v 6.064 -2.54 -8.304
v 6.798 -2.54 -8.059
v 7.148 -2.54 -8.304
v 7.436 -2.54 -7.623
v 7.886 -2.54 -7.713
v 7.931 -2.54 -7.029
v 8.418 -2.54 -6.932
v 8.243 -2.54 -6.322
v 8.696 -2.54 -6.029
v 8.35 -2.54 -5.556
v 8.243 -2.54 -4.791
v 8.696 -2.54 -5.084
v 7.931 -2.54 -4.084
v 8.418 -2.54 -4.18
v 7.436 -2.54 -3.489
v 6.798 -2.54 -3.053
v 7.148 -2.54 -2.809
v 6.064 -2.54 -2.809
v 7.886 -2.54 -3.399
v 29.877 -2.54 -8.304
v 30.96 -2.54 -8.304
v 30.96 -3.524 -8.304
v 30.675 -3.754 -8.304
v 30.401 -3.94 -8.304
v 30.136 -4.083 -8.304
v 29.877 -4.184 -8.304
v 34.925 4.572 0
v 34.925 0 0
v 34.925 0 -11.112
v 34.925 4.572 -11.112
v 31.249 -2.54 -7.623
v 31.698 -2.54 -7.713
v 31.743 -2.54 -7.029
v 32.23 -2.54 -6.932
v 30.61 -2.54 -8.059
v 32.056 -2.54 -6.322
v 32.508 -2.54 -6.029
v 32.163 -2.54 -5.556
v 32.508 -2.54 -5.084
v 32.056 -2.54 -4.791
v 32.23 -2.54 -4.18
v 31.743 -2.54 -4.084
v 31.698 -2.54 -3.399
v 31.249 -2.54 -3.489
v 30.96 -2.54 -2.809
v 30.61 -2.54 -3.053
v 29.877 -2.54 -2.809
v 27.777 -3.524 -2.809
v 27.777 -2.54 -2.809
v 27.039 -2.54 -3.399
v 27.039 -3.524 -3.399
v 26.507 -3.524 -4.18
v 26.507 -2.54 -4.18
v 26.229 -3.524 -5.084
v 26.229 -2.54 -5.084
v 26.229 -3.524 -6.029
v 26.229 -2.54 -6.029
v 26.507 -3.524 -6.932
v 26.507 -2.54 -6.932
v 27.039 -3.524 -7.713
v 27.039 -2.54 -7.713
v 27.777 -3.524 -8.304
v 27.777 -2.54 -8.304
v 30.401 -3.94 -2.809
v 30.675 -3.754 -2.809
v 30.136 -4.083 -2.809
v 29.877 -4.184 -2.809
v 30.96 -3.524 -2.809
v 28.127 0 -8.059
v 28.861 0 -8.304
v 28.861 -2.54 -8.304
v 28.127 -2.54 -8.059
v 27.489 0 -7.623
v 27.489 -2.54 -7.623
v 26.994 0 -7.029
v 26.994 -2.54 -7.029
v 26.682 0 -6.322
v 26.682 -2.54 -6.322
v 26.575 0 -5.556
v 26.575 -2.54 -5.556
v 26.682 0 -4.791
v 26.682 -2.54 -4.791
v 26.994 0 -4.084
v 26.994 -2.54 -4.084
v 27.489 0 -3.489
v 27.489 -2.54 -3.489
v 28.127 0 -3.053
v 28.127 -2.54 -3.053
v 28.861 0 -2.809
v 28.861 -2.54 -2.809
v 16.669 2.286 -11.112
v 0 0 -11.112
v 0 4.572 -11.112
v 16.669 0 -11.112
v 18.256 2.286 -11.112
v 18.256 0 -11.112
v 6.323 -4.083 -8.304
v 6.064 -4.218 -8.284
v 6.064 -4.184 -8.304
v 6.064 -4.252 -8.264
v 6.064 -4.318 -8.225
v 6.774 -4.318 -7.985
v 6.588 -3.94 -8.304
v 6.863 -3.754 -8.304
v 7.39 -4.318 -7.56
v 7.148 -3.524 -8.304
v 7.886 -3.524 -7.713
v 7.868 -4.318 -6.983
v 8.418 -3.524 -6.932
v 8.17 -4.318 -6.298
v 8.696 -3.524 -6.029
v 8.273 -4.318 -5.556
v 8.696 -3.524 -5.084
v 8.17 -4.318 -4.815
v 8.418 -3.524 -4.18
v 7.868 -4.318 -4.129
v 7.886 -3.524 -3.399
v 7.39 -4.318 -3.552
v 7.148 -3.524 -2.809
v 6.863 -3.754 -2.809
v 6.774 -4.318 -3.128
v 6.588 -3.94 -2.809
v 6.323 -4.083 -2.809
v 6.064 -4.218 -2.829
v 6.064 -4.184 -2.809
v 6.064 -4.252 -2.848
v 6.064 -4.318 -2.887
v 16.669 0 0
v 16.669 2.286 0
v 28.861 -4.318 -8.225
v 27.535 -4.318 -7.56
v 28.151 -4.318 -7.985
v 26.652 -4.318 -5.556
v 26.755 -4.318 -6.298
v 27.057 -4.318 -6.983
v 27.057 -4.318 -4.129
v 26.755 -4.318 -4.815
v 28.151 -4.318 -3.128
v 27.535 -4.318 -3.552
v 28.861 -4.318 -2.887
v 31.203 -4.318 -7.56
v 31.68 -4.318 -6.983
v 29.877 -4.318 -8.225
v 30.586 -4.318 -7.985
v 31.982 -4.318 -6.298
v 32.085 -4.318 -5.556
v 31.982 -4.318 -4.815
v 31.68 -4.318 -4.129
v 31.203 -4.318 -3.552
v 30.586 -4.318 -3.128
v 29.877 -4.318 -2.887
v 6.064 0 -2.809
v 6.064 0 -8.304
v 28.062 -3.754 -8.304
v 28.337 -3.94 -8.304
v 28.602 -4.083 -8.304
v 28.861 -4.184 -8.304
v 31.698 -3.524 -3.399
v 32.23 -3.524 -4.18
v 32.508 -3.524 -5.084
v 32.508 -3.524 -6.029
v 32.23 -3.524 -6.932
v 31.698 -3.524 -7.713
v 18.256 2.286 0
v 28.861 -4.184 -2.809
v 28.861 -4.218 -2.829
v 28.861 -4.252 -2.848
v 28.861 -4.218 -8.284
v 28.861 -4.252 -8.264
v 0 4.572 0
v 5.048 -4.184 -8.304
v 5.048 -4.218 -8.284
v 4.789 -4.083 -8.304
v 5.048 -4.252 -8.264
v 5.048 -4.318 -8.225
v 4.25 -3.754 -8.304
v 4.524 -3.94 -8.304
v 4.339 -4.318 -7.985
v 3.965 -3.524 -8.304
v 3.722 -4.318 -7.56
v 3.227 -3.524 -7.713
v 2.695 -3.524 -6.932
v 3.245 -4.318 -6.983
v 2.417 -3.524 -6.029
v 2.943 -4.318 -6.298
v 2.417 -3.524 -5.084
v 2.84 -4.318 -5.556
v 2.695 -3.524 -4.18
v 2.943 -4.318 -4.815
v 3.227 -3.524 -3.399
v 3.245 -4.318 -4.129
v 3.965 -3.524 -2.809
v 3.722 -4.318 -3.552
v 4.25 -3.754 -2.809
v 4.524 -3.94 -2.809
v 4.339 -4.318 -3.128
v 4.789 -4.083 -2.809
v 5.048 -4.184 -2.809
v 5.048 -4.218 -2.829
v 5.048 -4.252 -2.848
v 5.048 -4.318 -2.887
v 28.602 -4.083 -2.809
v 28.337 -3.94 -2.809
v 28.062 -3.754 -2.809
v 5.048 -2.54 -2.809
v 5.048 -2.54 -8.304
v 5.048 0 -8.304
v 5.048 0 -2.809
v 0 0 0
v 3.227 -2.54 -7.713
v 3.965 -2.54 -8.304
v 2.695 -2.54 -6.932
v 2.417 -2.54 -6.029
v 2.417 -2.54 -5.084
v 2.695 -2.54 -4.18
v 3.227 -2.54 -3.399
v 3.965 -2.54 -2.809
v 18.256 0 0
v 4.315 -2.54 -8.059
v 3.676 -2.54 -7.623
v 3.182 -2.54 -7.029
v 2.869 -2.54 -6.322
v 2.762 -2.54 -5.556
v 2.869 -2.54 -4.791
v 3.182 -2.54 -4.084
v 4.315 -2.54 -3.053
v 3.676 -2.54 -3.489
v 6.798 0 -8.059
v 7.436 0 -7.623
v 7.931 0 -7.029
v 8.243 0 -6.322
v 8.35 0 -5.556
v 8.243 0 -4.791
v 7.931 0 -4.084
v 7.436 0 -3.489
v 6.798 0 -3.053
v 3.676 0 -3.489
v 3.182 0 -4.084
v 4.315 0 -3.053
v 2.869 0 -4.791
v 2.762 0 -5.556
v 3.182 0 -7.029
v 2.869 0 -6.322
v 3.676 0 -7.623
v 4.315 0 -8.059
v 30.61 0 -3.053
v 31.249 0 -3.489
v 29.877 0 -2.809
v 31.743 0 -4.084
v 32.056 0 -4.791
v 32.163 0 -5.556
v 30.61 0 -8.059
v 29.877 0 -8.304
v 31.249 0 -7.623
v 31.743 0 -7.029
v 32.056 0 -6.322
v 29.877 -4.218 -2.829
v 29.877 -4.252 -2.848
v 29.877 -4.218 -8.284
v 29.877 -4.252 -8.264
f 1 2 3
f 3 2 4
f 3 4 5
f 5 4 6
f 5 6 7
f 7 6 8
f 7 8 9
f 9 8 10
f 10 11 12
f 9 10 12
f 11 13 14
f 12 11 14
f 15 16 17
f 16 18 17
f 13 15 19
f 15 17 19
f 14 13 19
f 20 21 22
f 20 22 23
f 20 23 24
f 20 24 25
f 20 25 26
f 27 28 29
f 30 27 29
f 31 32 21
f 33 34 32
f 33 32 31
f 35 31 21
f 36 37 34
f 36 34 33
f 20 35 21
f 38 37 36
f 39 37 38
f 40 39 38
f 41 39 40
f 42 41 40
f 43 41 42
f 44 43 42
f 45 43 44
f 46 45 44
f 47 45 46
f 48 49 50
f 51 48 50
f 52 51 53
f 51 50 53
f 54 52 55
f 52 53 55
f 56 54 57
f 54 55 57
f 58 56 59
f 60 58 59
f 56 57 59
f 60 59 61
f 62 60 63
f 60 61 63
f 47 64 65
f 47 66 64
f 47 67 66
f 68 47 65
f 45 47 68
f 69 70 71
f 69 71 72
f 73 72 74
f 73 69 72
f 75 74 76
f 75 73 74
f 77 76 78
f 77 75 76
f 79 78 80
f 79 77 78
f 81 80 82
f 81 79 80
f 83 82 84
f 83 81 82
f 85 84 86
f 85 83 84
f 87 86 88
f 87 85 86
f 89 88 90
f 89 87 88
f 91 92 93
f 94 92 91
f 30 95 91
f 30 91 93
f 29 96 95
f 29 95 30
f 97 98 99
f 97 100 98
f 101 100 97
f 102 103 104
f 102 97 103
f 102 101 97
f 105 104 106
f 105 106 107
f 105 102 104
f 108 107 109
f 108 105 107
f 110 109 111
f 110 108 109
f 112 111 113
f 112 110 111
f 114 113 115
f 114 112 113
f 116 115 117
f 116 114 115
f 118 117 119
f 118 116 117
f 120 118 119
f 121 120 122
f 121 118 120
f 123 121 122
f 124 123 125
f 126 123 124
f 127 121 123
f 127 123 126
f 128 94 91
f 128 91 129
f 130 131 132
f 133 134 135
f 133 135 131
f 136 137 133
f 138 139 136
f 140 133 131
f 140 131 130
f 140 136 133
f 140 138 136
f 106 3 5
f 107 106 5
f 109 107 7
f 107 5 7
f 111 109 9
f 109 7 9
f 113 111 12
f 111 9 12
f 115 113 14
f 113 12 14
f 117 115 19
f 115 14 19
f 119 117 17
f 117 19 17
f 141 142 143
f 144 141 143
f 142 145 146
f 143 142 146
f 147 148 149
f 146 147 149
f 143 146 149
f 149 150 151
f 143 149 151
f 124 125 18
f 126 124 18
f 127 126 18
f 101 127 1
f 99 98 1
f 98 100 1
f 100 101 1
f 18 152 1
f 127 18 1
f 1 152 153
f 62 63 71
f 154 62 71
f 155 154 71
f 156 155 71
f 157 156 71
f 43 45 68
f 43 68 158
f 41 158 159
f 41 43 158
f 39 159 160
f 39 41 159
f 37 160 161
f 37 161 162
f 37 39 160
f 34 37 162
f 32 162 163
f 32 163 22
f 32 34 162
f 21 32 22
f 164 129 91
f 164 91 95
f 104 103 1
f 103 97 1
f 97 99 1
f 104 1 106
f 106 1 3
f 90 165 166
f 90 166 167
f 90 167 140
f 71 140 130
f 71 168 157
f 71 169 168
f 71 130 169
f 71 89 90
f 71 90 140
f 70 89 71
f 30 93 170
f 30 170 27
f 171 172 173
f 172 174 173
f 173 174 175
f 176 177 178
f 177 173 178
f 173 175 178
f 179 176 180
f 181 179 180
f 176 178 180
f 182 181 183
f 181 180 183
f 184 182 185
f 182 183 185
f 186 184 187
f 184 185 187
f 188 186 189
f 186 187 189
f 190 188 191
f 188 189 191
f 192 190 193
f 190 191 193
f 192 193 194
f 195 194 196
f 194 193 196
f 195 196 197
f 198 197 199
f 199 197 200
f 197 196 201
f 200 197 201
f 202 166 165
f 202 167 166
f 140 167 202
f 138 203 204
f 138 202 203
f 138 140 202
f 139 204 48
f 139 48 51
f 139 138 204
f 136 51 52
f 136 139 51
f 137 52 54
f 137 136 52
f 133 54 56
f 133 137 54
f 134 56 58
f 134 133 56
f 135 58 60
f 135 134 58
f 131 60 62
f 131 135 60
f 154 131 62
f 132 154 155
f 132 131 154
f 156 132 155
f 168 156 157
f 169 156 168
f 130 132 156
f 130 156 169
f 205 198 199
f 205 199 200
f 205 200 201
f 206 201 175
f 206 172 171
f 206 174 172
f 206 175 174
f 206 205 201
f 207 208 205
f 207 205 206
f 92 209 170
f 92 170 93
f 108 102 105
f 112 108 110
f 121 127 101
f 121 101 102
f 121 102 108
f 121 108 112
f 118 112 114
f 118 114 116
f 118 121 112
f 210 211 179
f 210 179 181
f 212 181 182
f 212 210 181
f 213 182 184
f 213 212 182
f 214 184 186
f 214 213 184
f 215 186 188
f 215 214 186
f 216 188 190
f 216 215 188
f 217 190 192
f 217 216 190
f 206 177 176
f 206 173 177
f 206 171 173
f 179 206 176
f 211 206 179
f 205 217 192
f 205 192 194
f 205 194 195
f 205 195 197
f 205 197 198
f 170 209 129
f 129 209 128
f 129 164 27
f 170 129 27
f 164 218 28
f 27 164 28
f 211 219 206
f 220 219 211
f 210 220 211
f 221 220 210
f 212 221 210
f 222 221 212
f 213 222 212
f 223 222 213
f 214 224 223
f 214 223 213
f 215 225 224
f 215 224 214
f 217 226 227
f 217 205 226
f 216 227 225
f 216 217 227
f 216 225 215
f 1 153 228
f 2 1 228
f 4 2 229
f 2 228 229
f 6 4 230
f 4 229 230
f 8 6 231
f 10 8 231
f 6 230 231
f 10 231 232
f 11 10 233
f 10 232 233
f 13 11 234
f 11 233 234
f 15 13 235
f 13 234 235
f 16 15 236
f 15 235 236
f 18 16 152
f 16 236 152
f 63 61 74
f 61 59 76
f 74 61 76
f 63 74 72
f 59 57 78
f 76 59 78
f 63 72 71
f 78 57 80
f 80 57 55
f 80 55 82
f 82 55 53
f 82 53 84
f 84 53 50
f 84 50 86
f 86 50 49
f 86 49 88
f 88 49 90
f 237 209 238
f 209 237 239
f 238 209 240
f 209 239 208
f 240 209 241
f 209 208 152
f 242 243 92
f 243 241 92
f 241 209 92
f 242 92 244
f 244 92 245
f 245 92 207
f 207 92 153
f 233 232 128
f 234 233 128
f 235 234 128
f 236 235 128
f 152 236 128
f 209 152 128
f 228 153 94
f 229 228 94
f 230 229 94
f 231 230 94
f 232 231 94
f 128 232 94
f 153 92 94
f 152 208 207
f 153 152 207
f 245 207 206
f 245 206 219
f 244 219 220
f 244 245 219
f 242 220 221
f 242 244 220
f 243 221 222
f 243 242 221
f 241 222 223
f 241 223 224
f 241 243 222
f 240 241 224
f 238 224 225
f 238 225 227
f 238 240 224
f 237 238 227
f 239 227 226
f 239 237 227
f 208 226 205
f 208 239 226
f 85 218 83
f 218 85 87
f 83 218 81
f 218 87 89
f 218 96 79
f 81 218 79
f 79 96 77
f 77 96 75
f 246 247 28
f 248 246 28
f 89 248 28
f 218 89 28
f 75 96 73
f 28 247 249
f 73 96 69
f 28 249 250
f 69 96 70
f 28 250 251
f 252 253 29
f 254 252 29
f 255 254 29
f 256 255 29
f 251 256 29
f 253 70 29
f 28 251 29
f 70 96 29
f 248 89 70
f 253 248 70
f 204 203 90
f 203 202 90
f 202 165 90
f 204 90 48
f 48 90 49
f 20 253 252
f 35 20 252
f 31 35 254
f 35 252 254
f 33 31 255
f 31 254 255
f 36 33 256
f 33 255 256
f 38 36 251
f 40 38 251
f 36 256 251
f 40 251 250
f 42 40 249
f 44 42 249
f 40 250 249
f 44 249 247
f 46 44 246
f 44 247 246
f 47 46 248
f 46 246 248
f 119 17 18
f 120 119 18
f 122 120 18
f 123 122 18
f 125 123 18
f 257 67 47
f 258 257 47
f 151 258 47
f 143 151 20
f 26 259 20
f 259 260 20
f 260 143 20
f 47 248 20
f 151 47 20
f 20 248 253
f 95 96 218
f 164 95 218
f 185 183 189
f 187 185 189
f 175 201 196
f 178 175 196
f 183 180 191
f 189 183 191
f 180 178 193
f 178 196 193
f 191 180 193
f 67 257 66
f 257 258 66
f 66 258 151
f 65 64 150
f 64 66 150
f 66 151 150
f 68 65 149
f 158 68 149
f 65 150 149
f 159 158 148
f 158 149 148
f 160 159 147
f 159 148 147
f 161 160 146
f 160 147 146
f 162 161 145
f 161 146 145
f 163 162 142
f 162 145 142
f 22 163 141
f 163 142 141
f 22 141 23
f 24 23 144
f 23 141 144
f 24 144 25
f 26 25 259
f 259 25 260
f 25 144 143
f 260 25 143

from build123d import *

# Parameters (mm, degrees)
SKETCH1_W             = 34.925
SKETCH1_H             = 11.1125
BOSS_EXTRUDE1_DEPTH   = 4.572
SKETCH2_W             = 1.5875
SKETCH2_H             = 11.1125
CUT_EXTRUDE1_DEPTH    = 2.286
BOSS_EXTRUDE2_DEPTH   = 2.54
BOSS_EXTRUDE3_DEPTH   = 1.778
CHAMFER1_SIZE         = 0.79375
CHAMFER1_SIZE2        = 0.458271776
CHAMFER1_PART_2_SIZE  = 0.79375
CHAMFER1_PART_2_SIZE2 = 0.458271776
CHAMFER1_PART_3_SIZE  = 0.79375
CHAMFER1_PART_3_SIZE2 = 0.458271776
CHAMFER1_PART_4_SIZE  = 0.79375
CHAMFER1_PART_4_SIZE2 = 0.458271776


with BuildPart() as part:
    # Sketch1 → Boss-Extrude1 (new body)
    with BuildSketch(Plane(origin=(0, 0, 0), x_dir=(1, 0, 0), z_dir=(0, 1, 0))):
        with Locations((17.4625, 5.55625)):
            Rectangle(SKETCH1_W, SKETCH1_H)
    extrude(amount=BOSS_EXTRUDE1_DEPTH)

    # Sketch2 → Cut-Extrude1 (cut)
    with BuildSketch(Plane.XZ):
        with Locations((17.4625, -5.55625)):
            Rectangle(SKETCH2_W, SKETCH2_H)
    extrude(amount=-CUT_EXTRUDE1_DEPTH, mode=Mode.SUBTRACT)

    # Sketch3 → Boss-Extrude2 (add)
    with BuildSketch(Plane.XZ):
        with BuildLine():
            Line((5.04825, -2.808819928), (5.04825, -8.303680072))
            ThreePointArc((5.04825, -8.303680072), (2.76225, -5.55625), (5.04825, -2.808819928))
        make_face()
        with BuildLine():
            Line((6.06425, -2.808819928), (6.06425, -8.303680072))
            ThreePointArc((6.06425, -8.303680072), (8.35025, -5.55625), (6.06425, -2.808819928))
        make_face()
        with BuildLine():
            Line((28.86075, -2.808819928), (28.86075, -8.303680072))
            ThreePointArc((28.86075, -8.303680072), (26.57475, -5.55625), (28.86075, -2.808819928))
        make_face()
        with BuildLine():
            Line((29.87675, -2.808819928), (29.87675, -8.303680072))
            ThreePointArc((29.87675, -8.303680072), (32.16275, -5.55625), (29.87675, -2.808819928))
        make_face()
    extrude(amount=BOSS_EXTRUDE2_DEPTH)

    # Sketch4 → Boss-Extrude3 (add)
    with BuildSketch(Plane.XZ.offset(2.54)):
        with BuildLine():
            Line((5.04825, -2.808819928), (5.04825, -8.303680072))
            Line((5.04825, -8.303680072), (3.964944561, -8.303680072))
            ThreePointArc((3.964944561, -8.303680072), (2.38125, -5.55625), (3.964944561, -2.808819928))
            Line((3.964944561, -2.808819928), (5.04825, -2.808819928))
        make_face()
        with BuildLine():
            Line((6.06425, -2.808819928), (6.06425, -8.303680072))
            Line((6.06425, -8.303680072), (7.147555439, -8.303680072))
            ThreePointArc((7.147555439, -8.303680072), (8.73125, -5.55625), (7.147555439, -2.808819928))
            Line((7.147555439, -2.808819928), (6.06425, -2.808819928))
        make_face()
        with BuildLine():
            Line((28.86075, -2.808819928), (27.777444561, -2.808819928))
            ThreePointArc((27.777444561, -2.808819928), (26.19375, -5.55625), (27.777444561, -8.303680072))
            Line((27.777444561, -8.303680072), (28.86075, -8.303680072))
            Line((28.86075, -8.303680072), (28.86075, -2.808819928))
        make_face()
        with BuildLine():
            Line((29.87675, -2.808819928), (30.960055439, -2.808819928))
            ThreePointArc((30.960055439, -2.808819928), (32.54375, -5.55625), (30.960055439, -8.303680072))
            Line((30.960055439, -8.303680072), (29.87675, -8.303680072))
            Line((29.87675, -8.303680072), (29.87675, -2.808819928))
        make_face()
    extrude(amount=BOSS_EXTRUDE3_DEPTH)

    # Chamfer1
    chamfer1_edges = [part.edges().sort_by_distance(p)[0] for p in [
        (32.54375, -4.318, -5.55625),
    ]]
    chamfer1_side = [part.faces().sort_by_distance(p)[0] for p in [
        (32.54375, -3.429, -5.55625),
    ]]
    chamfer(chamfer1_edges, length=CHAMFER1_SIZE, length2=CHAMFER1_SIZE2, reference=chamfer1_side[0])

    # Chamfer1 part 2
    chamfer1_part_2_edges = [part.edges().sort_by_distance(p)[0] for p in [
        (26.19375, -4.318, -5.55625),
    ]]
    chamfer1_part_2_side = [part.faces().sort_by_distance(p)[0] for p in [
        (26.19375, -3.429, -5.55625),
    ]]
    chamfer(chamfer1_part_2_edges, length=CHAMFER1_PART_2_SIZE, length2=CHAMFER1_PART_2_SIZE2, reference=chamfer1_part_2_side[0])

    # Chamfer1 part 3
    chamfer1_part_3_edges = [part.edges().sort_by_distance(p)[0] for p in [
        (2.38125, -4.318, -5.55625),
    ]]
    chamfer1_part_3_side = [part.faces().sort_by_distance(p)[0] for p in [
        (2.38125, -3.429, -5.55625),
    ]]
    chamfer(chamfer1_part_3_edges, length=CHAMFER1_PART_3_SIZE, length2=CHAMFER1_PART_3_SIZE2, reference=chamfer1_part_3_side[0])

    # Chamfer1 part 4
    chamfer1_part_4_edges = [part.edges().sort_by_distance(p)[0] for p in [
        (8.73125, -4.318, -5.55625),
    ]]
    chamfer1_part_4_side = [part.faces().sort_by_distance(p)[0] for p in [
        (8.73125, -3.429, -5.55625),
    ]]
    chamfer(chamfer1_part_4_edges, length=CHAMFER1_PART_4_SIZE, length2=CHAMFER1_PART_4_SIZE2, reference=chamfer1_part_4_side[0])


solid = part.part
